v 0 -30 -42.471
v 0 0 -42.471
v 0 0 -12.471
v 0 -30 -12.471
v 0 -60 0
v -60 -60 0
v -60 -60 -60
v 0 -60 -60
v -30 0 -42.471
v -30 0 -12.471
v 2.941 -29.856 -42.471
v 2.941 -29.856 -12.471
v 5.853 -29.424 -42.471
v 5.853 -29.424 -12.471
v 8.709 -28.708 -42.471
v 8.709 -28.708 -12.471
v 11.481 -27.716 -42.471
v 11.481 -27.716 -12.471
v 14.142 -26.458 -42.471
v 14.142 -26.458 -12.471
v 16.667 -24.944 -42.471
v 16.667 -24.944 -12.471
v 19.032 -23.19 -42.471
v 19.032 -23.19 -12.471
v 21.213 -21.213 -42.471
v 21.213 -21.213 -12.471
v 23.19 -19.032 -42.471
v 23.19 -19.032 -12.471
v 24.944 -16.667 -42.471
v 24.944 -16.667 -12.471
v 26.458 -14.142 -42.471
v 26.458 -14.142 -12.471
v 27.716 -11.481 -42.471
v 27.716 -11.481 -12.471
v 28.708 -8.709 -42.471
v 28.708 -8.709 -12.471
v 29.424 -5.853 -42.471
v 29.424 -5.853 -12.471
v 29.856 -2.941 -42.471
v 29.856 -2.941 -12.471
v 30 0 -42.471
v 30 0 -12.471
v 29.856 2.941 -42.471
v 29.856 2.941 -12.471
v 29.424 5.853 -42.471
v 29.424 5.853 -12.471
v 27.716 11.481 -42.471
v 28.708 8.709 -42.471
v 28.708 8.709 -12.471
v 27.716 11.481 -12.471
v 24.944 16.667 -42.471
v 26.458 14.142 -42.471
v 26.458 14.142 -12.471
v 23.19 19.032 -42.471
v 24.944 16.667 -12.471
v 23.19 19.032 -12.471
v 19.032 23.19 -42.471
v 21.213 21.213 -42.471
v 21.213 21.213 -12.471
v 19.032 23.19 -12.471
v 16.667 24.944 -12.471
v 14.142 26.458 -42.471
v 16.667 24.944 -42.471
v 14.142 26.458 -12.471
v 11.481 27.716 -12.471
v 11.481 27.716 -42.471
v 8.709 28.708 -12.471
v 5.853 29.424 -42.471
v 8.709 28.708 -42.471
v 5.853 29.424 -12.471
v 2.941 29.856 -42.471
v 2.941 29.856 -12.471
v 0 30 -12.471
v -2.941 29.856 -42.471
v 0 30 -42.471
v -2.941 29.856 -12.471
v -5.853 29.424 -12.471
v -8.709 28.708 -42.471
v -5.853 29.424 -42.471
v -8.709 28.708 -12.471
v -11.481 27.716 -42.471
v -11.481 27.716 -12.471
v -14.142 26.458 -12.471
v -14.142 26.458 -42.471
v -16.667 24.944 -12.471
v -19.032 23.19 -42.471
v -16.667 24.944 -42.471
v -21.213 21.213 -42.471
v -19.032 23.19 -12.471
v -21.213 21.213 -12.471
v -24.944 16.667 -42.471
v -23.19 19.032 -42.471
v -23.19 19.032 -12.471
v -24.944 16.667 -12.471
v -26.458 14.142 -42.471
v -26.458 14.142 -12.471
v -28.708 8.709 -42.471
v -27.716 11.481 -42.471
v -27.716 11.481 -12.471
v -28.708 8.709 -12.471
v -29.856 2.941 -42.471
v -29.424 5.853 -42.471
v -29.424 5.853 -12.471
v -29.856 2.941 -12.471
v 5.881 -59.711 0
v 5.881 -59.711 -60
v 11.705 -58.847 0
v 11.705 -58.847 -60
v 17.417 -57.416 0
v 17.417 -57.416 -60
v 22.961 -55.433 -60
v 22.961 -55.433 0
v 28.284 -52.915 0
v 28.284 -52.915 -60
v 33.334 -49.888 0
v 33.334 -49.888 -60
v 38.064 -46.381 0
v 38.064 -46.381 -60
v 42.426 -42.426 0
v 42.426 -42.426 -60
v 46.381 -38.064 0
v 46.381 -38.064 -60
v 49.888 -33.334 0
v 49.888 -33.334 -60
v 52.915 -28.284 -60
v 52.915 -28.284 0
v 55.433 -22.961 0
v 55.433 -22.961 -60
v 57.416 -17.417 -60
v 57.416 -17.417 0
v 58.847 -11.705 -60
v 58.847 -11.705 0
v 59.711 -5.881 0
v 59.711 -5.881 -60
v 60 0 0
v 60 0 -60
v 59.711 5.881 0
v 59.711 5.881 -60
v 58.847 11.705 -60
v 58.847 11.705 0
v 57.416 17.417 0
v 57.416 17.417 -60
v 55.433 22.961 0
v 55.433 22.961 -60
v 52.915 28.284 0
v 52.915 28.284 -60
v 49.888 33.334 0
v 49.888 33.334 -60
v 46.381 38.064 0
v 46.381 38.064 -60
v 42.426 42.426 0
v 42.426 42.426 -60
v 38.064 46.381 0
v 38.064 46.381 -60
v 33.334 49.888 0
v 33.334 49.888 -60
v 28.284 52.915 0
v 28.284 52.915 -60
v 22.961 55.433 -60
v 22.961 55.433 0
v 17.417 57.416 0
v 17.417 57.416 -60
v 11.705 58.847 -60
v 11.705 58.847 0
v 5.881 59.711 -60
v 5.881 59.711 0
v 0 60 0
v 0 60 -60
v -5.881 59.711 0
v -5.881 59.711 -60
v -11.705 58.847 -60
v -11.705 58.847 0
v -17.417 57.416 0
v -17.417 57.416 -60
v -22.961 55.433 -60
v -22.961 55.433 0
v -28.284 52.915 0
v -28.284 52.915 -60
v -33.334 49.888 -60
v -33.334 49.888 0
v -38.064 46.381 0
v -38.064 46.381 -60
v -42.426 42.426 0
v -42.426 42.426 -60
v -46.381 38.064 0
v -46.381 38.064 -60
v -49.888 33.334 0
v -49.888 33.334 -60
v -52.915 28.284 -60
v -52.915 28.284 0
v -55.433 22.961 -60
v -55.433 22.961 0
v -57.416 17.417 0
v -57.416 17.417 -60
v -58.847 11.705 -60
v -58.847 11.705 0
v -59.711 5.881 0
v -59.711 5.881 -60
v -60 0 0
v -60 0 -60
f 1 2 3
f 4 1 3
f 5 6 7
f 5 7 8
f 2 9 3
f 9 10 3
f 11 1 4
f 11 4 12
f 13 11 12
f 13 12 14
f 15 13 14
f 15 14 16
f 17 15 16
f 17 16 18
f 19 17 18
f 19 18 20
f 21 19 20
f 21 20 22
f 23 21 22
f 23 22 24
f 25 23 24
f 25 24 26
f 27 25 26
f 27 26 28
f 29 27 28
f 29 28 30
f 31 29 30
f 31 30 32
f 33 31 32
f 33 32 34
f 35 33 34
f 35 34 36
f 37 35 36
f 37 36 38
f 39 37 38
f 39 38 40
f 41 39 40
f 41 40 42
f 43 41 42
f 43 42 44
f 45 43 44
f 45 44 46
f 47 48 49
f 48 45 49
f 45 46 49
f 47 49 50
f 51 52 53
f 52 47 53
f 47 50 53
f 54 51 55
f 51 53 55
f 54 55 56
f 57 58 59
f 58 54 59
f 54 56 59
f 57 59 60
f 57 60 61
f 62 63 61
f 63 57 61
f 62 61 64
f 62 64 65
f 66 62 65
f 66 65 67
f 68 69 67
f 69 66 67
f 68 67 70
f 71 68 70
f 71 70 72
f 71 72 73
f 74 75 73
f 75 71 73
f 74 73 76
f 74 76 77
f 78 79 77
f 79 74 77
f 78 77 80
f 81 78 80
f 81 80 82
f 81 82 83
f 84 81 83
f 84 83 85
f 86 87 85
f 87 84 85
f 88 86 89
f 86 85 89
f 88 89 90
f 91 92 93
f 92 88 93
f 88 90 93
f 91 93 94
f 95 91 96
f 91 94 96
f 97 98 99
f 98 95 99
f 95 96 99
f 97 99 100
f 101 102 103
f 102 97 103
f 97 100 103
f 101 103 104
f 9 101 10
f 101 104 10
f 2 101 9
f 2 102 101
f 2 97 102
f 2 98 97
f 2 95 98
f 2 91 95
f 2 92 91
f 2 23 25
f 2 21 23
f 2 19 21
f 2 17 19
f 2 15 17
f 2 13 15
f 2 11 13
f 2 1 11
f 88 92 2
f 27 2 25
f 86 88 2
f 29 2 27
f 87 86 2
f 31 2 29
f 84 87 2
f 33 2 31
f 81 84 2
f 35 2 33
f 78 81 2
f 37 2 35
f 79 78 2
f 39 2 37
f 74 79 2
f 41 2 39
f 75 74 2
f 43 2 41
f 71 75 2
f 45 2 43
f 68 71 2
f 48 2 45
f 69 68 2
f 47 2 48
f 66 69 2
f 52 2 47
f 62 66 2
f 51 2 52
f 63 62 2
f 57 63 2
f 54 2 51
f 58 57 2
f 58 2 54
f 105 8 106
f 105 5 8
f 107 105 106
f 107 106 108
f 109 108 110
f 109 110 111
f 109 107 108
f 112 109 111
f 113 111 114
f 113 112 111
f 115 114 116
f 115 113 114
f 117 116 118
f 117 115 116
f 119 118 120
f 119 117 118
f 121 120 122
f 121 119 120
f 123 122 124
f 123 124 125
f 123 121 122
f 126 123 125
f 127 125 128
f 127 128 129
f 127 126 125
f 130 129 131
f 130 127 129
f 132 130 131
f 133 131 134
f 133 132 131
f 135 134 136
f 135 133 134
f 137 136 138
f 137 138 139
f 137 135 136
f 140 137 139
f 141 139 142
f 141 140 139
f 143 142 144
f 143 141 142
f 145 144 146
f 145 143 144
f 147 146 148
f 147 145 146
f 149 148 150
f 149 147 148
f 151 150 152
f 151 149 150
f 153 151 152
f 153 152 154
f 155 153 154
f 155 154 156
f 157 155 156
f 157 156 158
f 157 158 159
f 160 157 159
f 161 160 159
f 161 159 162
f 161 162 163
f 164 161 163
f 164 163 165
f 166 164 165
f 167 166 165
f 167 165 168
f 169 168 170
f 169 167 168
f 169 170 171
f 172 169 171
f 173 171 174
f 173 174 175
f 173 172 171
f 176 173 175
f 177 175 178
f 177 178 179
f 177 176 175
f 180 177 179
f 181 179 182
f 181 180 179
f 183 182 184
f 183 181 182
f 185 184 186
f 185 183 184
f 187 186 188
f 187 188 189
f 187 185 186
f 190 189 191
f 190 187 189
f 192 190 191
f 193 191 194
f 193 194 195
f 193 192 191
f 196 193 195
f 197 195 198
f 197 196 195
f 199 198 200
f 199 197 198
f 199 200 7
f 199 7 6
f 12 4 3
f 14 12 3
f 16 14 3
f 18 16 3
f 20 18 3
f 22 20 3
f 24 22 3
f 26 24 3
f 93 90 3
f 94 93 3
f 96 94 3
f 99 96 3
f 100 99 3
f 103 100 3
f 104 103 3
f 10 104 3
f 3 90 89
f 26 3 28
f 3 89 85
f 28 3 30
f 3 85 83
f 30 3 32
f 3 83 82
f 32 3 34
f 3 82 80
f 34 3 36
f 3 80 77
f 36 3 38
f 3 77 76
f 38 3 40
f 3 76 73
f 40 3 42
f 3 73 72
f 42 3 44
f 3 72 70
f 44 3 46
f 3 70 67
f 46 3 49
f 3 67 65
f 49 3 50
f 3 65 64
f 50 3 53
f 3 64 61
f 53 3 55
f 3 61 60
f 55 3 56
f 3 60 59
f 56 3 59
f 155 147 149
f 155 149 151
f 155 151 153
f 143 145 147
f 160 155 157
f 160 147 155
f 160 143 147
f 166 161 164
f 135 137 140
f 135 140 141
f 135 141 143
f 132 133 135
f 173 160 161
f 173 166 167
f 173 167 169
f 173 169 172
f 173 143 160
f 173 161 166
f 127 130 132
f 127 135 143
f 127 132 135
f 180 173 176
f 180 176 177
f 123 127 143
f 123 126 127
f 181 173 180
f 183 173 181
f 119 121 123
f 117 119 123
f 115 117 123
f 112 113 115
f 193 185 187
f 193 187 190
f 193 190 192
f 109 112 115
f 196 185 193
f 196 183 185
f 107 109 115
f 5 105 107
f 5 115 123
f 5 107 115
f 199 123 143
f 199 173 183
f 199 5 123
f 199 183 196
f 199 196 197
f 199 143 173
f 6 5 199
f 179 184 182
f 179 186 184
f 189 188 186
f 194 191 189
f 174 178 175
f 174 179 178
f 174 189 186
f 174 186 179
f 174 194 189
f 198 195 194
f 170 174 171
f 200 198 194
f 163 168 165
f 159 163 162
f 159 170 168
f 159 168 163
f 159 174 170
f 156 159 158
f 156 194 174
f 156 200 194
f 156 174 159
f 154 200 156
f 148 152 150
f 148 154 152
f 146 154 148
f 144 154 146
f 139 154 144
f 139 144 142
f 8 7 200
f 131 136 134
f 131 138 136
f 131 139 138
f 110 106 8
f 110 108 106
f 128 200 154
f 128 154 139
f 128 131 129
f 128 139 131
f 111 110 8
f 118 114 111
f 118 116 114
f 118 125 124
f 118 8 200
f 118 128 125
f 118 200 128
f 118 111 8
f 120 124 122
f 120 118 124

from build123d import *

# Parameters (mm, degrees)
F0_W     = 60
F0_H     = 60
F1_DEPTH = 60
F2_W     = 30
F2_H     = 30


with BuildPart() as f1:
    # F0 (on Front) → F1 (new body)
    with BuildSketch(Plane.XZ):
        with Locations((-30, -30)):
            Rectangle(F0_W, F0_H)
    extrude(amount=F1_DEPTH)

    # F2 (on face) → F3 (revolve)
    with BuildSketch(Plane(origin=(0, 0, 0), x_dir=(-1, 0, 0), z_dir=(0, 1, 0))):
        with Locations((-15, -27.4707084894)):
            Rectangle(F2_W, F2_H)
        Polygon((0, -12.4707084894), (0, -42.4707084894), (0, -60), (60, -60), (60, 0), (0, 0), align=None)
    revolve(axis=Axis((0, 0, -27.4707084894), (0, 0, 1)))


solid = f1.part
